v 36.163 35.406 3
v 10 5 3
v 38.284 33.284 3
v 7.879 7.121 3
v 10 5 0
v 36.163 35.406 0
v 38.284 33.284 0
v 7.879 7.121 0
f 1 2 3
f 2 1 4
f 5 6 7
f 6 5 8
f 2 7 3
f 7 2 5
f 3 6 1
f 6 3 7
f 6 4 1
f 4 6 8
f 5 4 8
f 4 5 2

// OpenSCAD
// nicescad truss bridge example
// see https://wiki.bitplan.com/index.php/Creating_a_Model_Truss_Bridget_with_AI
// WF 2025-06-14
// Prompt: "Create an OpenSCAD module named beamAt that places a cube beam at a specified 3D position, applies a 3D rotation, and uses given dimensions. Add an example usage rotating the beam 45 degrees around the Z-axis."
module beamAt(position, rotation, dimensions) {
  translate(position)
    rotate(rotation)
      cube(dimensions);
}

// example usage
beamAt([10, 5, 0], [0, 0, 45], [40, 3, 3]);  // beam at position, rotated 45° on Z-axis
